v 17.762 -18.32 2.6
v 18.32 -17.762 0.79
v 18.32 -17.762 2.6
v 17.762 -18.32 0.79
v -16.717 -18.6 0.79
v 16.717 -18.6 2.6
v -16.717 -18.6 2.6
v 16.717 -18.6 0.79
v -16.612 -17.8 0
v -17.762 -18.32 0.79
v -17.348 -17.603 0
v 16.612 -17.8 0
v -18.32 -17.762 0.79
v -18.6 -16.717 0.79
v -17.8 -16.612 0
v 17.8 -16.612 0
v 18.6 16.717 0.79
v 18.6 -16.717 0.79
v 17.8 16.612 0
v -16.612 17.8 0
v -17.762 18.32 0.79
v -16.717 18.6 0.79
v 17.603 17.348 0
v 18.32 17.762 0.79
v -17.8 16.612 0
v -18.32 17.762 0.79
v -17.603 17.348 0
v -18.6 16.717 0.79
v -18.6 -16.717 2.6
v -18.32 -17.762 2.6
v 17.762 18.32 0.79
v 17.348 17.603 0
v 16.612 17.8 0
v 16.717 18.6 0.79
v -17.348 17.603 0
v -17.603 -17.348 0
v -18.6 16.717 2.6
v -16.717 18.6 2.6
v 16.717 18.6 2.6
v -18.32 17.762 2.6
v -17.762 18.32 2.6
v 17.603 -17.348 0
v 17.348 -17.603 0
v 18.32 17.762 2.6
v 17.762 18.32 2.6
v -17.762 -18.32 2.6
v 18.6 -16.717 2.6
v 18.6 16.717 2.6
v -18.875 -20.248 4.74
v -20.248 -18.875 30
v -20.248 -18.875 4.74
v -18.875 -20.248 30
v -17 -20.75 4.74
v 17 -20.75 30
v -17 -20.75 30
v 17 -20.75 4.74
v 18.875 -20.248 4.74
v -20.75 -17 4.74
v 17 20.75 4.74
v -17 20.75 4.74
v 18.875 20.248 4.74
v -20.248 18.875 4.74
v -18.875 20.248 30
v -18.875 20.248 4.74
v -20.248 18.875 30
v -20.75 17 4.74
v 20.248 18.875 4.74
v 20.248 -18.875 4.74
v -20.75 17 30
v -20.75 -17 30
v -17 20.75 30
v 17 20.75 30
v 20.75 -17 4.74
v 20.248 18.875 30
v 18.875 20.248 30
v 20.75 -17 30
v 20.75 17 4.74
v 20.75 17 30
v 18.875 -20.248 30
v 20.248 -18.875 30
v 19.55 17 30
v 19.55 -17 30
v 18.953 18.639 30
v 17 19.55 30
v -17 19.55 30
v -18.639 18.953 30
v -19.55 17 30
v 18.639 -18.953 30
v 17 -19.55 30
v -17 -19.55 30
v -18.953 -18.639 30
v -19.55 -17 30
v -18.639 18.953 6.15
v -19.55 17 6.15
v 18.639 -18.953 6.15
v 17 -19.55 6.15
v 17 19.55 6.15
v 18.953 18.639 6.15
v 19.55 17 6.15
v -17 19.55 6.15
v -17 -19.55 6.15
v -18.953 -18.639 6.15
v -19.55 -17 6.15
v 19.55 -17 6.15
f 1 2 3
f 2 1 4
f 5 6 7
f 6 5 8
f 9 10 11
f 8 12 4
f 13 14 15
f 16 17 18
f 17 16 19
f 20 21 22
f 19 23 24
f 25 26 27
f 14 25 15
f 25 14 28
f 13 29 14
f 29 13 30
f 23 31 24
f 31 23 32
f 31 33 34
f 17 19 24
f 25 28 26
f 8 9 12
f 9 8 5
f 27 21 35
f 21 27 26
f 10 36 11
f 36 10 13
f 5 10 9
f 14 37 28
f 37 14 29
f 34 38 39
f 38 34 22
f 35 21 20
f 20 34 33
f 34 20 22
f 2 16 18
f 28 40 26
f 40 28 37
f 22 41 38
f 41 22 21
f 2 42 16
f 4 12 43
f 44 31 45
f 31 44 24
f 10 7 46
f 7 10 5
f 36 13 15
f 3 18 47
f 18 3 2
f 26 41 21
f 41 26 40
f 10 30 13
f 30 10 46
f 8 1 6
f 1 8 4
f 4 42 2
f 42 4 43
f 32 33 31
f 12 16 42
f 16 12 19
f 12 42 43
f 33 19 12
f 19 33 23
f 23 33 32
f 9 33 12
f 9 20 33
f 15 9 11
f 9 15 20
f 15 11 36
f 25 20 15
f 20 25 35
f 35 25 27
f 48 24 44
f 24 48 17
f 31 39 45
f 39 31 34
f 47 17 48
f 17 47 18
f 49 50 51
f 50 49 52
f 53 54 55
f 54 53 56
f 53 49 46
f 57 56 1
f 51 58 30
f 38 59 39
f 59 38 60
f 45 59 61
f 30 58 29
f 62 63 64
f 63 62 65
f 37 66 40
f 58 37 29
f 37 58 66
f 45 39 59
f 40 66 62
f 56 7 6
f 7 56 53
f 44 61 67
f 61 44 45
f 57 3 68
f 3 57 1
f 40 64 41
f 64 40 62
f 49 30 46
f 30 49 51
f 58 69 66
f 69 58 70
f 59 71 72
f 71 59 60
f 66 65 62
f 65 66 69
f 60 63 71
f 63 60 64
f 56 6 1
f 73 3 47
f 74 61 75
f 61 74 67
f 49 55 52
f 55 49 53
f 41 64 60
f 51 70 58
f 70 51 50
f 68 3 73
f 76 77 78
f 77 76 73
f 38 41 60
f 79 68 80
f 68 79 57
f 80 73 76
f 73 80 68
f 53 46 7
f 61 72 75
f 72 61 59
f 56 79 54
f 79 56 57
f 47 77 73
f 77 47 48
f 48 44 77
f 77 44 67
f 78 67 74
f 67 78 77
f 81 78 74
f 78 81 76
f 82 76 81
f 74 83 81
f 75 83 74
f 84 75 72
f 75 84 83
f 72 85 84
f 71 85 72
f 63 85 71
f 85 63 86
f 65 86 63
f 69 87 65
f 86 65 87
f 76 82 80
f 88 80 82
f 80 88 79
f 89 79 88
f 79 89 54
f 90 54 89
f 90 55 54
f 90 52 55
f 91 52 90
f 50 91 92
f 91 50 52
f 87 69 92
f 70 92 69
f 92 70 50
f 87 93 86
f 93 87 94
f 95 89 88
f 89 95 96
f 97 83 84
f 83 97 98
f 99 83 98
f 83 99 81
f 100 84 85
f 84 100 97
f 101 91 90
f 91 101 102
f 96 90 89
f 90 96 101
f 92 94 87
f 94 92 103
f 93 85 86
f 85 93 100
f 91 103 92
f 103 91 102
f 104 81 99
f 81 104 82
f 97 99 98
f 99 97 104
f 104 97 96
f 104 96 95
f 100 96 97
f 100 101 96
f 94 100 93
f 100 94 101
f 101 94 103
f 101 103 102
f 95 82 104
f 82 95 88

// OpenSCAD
// bin_tips — 1x1 bin for syringe tips.
//
// PRINT: as emitted, feet down. No supports.
include <../lib/gridfinity.scad>

TIP_H = 30;   // [16:1:60] bin height

bin(1, 1, TIP_H);
